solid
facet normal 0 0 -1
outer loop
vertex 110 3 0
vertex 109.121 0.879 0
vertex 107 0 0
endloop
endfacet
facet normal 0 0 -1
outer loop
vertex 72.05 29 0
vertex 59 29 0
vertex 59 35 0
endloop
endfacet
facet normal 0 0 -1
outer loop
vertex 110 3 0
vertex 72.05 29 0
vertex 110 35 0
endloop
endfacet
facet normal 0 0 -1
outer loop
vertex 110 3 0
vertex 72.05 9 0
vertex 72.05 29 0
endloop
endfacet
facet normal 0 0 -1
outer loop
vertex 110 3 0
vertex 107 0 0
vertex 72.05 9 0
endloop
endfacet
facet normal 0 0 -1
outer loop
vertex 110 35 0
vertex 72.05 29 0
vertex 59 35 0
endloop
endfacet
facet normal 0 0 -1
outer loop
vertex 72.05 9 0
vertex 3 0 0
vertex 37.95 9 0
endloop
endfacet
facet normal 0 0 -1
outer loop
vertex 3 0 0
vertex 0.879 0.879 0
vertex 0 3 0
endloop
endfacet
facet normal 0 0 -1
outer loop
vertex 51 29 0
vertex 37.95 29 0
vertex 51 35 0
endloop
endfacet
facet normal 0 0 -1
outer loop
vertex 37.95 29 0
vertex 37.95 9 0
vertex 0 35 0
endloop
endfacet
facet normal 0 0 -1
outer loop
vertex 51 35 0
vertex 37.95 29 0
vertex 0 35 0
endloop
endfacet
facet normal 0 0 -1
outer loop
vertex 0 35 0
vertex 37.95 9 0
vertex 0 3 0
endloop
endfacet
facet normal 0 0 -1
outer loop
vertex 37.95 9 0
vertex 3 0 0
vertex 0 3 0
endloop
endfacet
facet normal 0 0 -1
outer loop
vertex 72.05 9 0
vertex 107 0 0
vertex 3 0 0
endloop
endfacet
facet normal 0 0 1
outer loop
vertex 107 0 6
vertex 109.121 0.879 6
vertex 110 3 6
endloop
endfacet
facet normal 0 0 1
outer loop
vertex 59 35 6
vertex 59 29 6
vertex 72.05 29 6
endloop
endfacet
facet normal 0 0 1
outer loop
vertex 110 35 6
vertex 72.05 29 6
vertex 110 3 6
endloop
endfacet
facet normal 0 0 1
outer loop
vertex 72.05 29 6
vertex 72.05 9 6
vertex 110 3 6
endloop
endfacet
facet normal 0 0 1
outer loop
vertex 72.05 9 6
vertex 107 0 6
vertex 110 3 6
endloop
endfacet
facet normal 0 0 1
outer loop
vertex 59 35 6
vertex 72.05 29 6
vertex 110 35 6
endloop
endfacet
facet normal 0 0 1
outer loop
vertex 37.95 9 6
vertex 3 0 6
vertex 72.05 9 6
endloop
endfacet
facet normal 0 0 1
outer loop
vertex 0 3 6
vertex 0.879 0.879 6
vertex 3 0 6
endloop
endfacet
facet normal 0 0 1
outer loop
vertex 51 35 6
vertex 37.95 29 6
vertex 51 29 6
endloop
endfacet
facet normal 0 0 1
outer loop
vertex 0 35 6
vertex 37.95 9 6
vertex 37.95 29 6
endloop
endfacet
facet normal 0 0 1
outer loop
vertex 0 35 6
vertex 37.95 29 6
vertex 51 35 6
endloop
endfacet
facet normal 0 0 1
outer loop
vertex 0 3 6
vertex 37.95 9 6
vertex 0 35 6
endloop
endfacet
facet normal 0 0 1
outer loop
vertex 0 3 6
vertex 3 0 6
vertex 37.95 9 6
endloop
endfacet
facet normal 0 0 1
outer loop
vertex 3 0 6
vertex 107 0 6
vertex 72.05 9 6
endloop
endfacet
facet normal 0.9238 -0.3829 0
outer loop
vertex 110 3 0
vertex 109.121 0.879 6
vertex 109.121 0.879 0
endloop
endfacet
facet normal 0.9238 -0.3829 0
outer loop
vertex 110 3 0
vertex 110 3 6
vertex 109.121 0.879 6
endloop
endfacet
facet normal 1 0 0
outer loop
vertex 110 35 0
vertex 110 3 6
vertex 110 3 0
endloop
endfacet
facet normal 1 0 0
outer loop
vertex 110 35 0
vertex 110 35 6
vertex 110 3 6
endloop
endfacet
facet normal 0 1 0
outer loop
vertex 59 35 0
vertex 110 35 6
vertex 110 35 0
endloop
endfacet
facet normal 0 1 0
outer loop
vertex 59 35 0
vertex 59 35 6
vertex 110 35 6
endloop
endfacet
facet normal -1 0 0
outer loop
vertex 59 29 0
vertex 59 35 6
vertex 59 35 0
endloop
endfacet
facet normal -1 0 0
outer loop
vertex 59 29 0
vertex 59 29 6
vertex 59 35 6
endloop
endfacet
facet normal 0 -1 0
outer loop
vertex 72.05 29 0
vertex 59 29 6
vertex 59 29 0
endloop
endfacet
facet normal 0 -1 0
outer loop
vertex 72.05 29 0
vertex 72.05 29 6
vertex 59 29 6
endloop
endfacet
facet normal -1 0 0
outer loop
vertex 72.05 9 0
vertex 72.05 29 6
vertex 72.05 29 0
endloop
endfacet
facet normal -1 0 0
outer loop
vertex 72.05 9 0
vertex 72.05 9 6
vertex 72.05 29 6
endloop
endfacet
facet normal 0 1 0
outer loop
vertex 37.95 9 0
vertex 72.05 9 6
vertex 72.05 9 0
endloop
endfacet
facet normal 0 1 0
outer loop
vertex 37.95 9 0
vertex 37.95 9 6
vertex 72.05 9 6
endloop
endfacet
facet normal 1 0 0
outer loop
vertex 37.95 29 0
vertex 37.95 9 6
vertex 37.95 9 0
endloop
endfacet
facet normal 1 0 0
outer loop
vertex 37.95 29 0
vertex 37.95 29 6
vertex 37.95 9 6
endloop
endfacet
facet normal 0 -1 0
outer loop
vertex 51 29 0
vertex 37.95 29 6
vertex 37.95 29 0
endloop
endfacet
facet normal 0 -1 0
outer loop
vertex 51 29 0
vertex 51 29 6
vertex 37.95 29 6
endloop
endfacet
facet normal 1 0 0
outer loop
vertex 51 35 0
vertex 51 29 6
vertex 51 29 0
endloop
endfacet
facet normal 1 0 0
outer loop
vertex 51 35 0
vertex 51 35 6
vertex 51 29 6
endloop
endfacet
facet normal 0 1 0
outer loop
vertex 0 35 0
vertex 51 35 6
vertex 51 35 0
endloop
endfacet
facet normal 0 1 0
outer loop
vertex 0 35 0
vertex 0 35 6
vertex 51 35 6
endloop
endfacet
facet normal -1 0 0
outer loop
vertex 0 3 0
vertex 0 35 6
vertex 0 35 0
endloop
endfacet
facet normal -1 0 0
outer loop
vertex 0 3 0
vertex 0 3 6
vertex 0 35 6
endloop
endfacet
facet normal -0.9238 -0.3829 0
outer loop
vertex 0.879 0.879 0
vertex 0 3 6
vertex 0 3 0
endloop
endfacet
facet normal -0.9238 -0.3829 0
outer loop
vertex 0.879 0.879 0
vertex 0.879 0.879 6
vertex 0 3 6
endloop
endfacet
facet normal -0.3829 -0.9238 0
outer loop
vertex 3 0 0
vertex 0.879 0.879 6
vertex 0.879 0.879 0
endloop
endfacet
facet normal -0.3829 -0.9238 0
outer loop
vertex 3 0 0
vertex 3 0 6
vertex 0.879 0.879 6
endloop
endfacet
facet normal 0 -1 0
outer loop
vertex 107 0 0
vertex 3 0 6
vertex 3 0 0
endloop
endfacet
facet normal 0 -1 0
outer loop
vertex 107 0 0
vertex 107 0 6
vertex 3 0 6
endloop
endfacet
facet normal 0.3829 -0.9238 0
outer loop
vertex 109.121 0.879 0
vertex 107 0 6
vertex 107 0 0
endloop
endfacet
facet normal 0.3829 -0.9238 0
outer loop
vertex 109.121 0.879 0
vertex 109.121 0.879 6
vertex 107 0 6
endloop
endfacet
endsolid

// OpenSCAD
$fn = 32;

// ----------------------------------------------------------------------
// Window plate: 110 x 35 mm, 1 open windows
// ----------------------------------------------------------------------

// --- parameters (mm) ---
profile_height = 6;       // extrusion height
profile_points = 16;      // points of the closed outline

profile = [[0, 3], [0.879, 0.879], [3, 0], [107, 0], [109.121, 0.879], [110, 3], [110, 35], [59, 35], [59, 29], [72.05, 29], [72.05, 9], [37.95, 9], [37.95, 29], [51, 29], [51, 35], [0, 35]];  // single closed polygon, 16 points, counter clockwise

// --- the one profile operation ---
linear_extrude(height = profile_height) polygon(points = profile);
